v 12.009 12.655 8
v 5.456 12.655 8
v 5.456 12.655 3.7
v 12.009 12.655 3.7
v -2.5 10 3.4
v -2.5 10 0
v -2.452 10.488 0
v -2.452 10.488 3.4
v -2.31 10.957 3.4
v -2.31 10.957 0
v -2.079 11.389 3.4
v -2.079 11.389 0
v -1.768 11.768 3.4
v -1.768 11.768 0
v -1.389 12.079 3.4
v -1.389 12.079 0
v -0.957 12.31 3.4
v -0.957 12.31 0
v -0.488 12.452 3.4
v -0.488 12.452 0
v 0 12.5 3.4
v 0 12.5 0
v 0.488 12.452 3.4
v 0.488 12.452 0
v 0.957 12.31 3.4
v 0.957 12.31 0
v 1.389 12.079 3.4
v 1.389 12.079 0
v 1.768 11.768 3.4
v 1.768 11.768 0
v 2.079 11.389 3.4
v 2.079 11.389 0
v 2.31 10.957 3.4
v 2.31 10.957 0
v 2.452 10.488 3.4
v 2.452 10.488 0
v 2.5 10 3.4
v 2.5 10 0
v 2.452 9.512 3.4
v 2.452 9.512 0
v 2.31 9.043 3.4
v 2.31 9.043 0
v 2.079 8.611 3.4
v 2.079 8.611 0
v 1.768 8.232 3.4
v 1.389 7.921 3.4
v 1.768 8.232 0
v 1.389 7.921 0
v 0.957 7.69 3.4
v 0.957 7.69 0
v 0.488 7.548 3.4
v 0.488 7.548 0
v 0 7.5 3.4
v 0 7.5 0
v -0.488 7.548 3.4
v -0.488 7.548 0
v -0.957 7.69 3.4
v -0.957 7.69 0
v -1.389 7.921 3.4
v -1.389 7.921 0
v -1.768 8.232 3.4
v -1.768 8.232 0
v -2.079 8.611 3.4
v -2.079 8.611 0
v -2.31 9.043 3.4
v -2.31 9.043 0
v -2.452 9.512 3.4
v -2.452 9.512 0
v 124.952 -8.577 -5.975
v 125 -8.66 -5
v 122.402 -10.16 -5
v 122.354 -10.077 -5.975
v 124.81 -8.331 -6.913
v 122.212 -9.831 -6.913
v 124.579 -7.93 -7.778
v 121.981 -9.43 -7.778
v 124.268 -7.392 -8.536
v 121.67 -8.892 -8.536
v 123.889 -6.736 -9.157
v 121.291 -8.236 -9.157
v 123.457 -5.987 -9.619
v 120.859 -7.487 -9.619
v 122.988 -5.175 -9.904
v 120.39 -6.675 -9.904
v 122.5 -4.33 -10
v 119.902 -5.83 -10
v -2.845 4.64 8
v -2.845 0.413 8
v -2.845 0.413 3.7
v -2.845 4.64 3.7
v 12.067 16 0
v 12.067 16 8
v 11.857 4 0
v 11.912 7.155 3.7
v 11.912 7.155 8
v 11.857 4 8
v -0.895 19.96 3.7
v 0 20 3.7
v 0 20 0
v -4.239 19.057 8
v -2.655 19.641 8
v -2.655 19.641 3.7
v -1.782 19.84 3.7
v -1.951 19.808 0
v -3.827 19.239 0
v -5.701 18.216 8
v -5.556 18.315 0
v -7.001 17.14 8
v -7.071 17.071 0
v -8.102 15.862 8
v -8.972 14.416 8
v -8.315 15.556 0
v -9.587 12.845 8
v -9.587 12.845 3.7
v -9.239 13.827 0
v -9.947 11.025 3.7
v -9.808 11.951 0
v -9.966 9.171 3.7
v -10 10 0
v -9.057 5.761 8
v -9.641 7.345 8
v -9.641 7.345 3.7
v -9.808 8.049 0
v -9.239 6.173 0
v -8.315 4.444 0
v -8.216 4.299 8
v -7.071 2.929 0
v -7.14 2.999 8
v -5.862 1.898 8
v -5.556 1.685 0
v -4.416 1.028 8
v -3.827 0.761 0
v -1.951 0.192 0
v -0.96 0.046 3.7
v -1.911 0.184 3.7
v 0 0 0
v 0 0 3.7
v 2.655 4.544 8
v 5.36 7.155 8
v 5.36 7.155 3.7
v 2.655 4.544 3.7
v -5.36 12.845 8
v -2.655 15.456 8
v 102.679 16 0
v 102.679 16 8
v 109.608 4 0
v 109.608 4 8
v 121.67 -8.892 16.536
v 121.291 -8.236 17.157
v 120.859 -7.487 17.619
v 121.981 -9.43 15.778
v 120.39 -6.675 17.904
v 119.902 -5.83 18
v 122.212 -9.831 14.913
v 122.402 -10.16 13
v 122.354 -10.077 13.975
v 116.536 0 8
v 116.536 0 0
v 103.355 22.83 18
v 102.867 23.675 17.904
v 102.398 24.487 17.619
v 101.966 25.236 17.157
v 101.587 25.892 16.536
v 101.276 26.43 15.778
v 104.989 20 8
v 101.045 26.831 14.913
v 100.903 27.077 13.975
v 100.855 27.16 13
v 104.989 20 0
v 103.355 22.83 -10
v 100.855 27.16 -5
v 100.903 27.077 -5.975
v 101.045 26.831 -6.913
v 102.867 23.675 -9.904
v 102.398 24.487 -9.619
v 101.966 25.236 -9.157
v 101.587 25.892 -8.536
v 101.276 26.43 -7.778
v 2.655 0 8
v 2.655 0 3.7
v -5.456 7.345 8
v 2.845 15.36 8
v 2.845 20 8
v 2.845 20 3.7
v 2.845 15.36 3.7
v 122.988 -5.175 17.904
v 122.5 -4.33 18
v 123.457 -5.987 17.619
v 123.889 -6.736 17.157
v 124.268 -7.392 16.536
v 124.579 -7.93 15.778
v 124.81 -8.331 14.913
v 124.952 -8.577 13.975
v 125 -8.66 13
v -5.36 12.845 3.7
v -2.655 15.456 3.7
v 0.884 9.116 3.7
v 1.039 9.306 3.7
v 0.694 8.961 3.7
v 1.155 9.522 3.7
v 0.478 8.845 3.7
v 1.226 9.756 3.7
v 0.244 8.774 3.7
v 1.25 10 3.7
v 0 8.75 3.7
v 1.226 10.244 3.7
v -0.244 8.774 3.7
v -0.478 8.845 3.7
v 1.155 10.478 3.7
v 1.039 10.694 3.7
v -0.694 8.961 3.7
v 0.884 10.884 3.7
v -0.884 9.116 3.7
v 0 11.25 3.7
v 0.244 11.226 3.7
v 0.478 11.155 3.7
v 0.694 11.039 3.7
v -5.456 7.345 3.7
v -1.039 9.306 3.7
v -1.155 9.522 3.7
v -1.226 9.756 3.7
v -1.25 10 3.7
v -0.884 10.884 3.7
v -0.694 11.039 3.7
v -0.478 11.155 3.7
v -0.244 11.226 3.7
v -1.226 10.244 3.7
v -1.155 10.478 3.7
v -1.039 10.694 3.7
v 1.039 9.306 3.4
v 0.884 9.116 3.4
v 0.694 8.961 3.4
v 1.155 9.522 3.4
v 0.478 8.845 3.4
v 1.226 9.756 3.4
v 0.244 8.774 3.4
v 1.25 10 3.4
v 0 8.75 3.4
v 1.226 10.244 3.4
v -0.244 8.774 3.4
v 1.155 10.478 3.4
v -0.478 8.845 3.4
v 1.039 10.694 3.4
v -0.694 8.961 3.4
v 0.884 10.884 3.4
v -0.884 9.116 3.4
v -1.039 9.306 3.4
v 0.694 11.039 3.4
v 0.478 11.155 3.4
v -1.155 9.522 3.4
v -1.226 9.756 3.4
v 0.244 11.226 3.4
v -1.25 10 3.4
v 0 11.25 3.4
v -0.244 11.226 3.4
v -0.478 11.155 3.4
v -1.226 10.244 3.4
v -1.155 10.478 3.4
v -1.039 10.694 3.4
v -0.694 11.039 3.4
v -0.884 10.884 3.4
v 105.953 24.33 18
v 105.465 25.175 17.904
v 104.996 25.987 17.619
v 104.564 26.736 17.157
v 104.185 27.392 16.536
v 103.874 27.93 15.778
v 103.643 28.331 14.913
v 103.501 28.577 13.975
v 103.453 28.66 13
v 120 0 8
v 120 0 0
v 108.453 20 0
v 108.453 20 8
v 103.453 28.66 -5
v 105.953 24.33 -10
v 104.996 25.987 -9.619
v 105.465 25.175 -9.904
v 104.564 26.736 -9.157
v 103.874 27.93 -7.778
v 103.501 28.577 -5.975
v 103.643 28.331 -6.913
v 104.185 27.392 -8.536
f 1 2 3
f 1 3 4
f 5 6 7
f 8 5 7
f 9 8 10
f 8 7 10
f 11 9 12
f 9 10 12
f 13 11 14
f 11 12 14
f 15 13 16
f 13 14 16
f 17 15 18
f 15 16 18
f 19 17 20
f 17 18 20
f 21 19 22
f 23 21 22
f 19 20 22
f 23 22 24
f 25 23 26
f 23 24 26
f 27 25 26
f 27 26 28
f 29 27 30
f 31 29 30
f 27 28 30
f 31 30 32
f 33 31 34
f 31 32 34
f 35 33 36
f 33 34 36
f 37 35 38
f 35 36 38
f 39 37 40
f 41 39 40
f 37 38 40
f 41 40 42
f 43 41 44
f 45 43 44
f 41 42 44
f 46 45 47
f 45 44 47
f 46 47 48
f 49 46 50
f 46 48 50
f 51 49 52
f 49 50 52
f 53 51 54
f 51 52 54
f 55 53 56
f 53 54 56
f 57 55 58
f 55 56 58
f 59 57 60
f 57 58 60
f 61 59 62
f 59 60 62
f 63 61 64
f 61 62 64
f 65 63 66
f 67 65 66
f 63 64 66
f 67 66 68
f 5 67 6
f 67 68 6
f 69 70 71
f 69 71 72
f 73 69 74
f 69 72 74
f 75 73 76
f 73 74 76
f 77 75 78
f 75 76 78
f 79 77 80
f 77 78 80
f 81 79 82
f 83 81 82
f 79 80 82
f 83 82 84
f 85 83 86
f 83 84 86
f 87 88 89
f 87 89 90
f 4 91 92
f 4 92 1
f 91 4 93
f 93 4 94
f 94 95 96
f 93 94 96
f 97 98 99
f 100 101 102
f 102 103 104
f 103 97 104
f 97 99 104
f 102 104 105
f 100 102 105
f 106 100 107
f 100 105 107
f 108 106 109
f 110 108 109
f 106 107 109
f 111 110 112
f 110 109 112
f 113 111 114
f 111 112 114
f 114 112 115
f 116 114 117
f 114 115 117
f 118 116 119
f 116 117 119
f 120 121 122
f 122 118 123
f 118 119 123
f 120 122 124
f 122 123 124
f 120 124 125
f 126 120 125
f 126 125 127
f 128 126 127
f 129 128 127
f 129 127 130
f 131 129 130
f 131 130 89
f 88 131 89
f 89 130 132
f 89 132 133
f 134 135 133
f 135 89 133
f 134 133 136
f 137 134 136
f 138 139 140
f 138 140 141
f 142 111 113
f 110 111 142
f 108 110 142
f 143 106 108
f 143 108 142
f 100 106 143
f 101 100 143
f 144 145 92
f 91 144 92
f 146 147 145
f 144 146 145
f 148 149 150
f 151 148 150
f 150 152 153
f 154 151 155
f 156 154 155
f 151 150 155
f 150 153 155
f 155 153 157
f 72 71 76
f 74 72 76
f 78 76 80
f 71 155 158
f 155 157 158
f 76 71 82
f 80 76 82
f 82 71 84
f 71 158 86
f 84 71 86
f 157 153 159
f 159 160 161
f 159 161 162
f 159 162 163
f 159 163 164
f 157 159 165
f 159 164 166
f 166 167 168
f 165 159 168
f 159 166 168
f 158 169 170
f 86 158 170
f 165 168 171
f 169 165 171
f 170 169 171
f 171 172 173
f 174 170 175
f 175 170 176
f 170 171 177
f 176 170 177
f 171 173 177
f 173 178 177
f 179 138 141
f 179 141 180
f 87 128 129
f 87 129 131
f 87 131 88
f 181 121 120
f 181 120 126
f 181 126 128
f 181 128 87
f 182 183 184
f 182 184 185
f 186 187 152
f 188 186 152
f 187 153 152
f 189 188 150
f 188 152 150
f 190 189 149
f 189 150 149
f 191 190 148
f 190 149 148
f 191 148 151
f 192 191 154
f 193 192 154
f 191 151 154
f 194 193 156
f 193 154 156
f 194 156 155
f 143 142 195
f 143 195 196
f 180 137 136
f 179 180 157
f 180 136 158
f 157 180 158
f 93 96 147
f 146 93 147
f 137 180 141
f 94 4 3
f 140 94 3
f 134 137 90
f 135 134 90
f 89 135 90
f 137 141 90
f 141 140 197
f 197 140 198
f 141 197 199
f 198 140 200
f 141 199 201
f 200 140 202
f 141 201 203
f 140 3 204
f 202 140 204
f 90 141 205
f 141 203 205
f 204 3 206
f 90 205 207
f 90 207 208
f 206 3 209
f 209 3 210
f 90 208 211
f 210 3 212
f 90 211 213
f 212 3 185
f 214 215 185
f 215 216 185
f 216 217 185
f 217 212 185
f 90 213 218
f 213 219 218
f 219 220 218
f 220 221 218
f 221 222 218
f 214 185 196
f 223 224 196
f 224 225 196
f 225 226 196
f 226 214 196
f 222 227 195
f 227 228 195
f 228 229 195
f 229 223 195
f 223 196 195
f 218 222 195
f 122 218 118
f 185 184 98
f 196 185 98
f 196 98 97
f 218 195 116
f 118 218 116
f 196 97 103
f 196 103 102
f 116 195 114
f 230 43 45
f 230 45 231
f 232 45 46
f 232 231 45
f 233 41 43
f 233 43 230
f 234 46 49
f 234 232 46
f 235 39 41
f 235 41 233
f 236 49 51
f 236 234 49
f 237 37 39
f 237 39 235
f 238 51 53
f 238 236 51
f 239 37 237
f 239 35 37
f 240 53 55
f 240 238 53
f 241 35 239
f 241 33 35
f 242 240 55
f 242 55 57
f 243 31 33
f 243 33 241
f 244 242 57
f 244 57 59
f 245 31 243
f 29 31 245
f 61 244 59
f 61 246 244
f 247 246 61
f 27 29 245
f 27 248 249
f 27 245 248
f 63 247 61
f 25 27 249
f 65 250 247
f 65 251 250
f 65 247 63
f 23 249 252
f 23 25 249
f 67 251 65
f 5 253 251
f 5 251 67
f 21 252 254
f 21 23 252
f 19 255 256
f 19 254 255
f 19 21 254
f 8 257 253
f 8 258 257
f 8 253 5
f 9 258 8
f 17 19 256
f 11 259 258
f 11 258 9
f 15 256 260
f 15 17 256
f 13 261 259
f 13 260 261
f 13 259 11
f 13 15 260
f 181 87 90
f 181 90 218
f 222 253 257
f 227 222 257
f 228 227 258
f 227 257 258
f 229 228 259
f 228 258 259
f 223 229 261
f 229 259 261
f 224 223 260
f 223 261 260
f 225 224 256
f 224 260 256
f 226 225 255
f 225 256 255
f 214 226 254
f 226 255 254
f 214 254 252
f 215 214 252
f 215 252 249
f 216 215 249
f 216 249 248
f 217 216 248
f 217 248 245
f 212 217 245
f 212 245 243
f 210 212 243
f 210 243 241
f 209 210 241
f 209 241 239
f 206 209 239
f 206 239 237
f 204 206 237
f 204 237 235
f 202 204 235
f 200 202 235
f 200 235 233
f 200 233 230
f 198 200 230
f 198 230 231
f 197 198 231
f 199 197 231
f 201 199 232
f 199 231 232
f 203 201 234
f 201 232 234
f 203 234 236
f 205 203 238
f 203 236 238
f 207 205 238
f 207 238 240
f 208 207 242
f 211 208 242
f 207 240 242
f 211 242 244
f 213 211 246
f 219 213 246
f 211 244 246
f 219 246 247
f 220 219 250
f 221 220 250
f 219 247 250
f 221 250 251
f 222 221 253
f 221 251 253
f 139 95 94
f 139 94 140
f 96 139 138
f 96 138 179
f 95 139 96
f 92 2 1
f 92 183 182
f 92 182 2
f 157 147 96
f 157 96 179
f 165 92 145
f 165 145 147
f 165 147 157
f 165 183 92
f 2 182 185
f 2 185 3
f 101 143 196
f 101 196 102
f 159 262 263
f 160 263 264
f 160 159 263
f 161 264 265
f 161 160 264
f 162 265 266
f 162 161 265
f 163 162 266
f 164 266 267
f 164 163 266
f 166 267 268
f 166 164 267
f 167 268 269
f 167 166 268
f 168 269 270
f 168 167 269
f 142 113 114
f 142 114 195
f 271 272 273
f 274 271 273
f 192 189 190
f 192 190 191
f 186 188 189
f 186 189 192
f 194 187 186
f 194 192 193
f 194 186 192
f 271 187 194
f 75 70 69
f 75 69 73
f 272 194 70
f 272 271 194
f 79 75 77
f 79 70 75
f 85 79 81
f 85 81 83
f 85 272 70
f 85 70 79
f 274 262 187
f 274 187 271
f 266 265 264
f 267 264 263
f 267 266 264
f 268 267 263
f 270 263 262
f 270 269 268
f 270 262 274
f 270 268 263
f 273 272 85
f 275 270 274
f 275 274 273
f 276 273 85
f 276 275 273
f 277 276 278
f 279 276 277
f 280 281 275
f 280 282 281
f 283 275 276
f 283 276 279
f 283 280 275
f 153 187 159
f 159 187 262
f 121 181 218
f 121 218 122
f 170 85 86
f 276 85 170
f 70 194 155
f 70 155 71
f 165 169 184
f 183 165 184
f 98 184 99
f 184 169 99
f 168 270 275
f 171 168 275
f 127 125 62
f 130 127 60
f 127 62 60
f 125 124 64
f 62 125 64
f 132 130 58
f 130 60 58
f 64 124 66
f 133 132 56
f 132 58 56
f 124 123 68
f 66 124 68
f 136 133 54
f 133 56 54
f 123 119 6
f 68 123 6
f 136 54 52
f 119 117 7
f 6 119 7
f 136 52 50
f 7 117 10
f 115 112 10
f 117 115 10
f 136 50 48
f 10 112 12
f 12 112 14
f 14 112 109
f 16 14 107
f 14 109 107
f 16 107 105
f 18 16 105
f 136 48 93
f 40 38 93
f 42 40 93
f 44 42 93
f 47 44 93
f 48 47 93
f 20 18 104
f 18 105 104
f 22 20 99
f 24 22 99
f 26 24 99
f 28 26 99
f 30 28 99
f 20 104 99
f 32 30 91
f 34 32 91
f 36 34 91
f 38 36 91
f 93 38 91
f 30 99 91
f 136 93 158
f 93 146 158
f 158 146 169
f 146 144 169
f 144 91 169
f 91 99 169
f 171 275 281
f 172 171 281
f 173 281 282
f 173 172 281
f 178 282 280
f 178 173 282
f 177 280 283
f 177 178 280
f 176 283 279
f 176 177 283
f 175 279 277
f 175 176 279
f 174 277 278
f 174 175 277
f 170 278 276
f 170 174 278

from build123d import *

# Parameters (mm, degrees)
BOSS_EXTRU_1_DEPTH       = 8
ESQUISSE13_R             = 4
ENL_V_MAT_EXTRU_9_DEPTH  = 4.3
ENL_V_MAT_EXTRU_10_DEPTH = 4.3
ESQUISSE15_R             = 2.5
ENL_V_MAT_EXTRU_11_DEPTH = 3.4
ENL_V_MAT_EXTRU_12_REACH = 6.6
ESQUISSE16_R             = 1.25
ESQUISSE17_W             = 10
ESQUISSE17_H             = 20
ENL_V_MAT_EXTRU_13_DEPTH = 10
ENL_V_MAT_EXTRU_15_DEPTH = 10
ESQUISSE20_W             = 28
ESQUISSE20_H             = 43.094010768
BOSS_EXTRU_2_DEPTH       = 3
ENL_V_MAT_EXTRU_16_REACH = 20
CONG_1_R                 = 5


with BuildPart() as part:
    # Esquisse1 → Boss.-Extru.1 (new body)
    with BuildSketch(Plane.XY):
        with BuildLine():
            Line((0, 0), (120, 0))
            ThreePointArc((120, 0), (130, 10), (120, 20))
            Line((120, 20), (0, 20))
            ThreePointArc((0, 20), (-10, 10), (0, 0))
        make_face()
    extrude(amount=BOSS_EXTRU_1_DEPTH)

    # Esquisse13 → Enlèv. mat.-Extru.9 (cut)
    with BuildSketch(Plane.XY.offset(8)):
        with Locations((0, 10)):
            Circle(ESQUISSE13_R)
    extrude(amount=-ENL_V_MAT_EXTRU_9_DEPTH, mode=Mode.SUBTRACT)

    # Esquisse14 → Enlèv. mat.-Extru.10 (cut)
    with BuildSketch(Plane.XY.offset(8)):
        Polygon((2.655377087, 4.544050257), (2.655377087, -2.008601379), (-2.844622913, -1.912365766), (-2.844622913, 4.640285869), (-5.455949743, 7.344622913), (-12.008601379, 7.344622913), (-11.912365766, 12.844622913), (-5.359714131, 12.844622913), (-2.655377087, 15.455949743), (-2.655377087, 22.008601379), (2.844622913, 21.912365766), (2.844622913, 15.359714131), (5.455949743, 12.655377087), (12.008601379, 12.655377087), (11.912365766, 7.155377087), (5.359714131, 7.155377087), align=None)
    extrude(amount=-ENL_V_MAT_EXTRU_10_DEPTH, mode=Mode.SUBTRACT)

    # Esquisse15 → Enlèv. mat.-Extru.11 (cut)
    with BuildSketch(Plane(origin=(0, 0, 0), x_dir=(-1, 0, 0), z_dir=(0, 0, -1))):
        with Locations((0, 10)):
            Circle(ESQUISSE15_R)
    extrude(amount=-ENL_V_MAT_EXTRU_11_DEPTH, mode=Mode.SUBTRACT)

    # Esquisse16 → Enlèv. mat.-Extru.12 (cut, up to next)
    with BuildSketch(Plane(origin=(0, 0, 3.4), x_dir=(-1, 0, 0), z_dir=(0, 0, -1)), mode=Mode.PRIVATE) as enl_v_mat_extru_12_sk1:
        with Locations((0, 10)):
            Circle(ESQUISSE16_R)
    enl_v_mat_extru_12_tool1 = extrude(enl_v_mat_extru_12_sk1.sketch, amount=-ENL_V_MAT_EXTRU_12_REACH, mode=Mode.PRIVATE) & part.part
    add(enl_v_mat_extru_12_tool1.solids().sort_by_distance((0, 10, 3.4))[0], mode=Mode.SUBTRACT)

    # Esquisse17 → Enlèv. mat.-Extru.13 (cut)
    with BuildSketch(Plane.XY.offset(8)):
        with Locations((125, 10)):
            Rectangle(ESQUISSE17_W, ESQUISSE17_H)
    extrude(amount=-ENL_V_MAT_EXTRU_13_DEPTH, mode=Mode.SUBTRACT)

    # Esquisse19 → Enlèv. mat.-Extru.15 (cut)
    with BuildSketch(Plane(origin=(0, 0, 0), x_dir=(-1, 0, 0), z_dir=(0, 0, -1))):
        Polygon((-131.547005384, 0), (-120, 0), (-108.452994616, 20), (-120, 20), align=None)
    extrude(amount=-ENL_V_MAT_EXTRU_15_DEPTH, mode=Mode.SUBTRACT)

    # Esquisse20 → Boss.-Extru.2 (add)
    with BuildSketch(Plane(origin=(90, 51.961524227, 0), x_dir=(0, 0, -1), z_dir=(0.866025404, 0.5, 0))):
        with Locations((-4, -48.452994616)):
            Rectangle(ESQUISSE20_W, ESQUISSE20_H)
    extrude(amount=-BOSS_EXTRU_2_DEPTH)

    # Esquisse21 → Enlèv. mat.-Extru.16 (cut, up to next)
    with BuildSketch(Plane.XY.offset(8), mode=Mode.PRIVATE) as enl_v_mat_extru_16_sk1:
        Polygon((11.857154921, 4), (109.607695155, 4), (102.679491924, 16), (12.06712353, 16), align=None)
    enl_v_mat_extru_16_tool1 = extrude(enl_v_mat_extru_16_sk1.sketch, amount=-ENL_V_MAT_EXTRU_16_REACH, mode=Mode.PRIVATE) & part.part
    add(enl_v_mat_extru_16_tool1.solids().sort_by_distance((59.074082, 9.924208, 8))[0], mode=Mode.SUBTRACT)

    # Congé1
    cong_1_edges = [part.edges().sort_by_distance(p)[0] for p in [
        (123.700961894, -9.410254038, 18),
        (102.153956511, 27.910254038, 18),
        (102.153956511, 27.910254038, -10),
        (123.700961894, -9.410254038, -10),
    ]]
    fillet(cong_1_edges, radius=CONG_1_R)


solid = part.part
